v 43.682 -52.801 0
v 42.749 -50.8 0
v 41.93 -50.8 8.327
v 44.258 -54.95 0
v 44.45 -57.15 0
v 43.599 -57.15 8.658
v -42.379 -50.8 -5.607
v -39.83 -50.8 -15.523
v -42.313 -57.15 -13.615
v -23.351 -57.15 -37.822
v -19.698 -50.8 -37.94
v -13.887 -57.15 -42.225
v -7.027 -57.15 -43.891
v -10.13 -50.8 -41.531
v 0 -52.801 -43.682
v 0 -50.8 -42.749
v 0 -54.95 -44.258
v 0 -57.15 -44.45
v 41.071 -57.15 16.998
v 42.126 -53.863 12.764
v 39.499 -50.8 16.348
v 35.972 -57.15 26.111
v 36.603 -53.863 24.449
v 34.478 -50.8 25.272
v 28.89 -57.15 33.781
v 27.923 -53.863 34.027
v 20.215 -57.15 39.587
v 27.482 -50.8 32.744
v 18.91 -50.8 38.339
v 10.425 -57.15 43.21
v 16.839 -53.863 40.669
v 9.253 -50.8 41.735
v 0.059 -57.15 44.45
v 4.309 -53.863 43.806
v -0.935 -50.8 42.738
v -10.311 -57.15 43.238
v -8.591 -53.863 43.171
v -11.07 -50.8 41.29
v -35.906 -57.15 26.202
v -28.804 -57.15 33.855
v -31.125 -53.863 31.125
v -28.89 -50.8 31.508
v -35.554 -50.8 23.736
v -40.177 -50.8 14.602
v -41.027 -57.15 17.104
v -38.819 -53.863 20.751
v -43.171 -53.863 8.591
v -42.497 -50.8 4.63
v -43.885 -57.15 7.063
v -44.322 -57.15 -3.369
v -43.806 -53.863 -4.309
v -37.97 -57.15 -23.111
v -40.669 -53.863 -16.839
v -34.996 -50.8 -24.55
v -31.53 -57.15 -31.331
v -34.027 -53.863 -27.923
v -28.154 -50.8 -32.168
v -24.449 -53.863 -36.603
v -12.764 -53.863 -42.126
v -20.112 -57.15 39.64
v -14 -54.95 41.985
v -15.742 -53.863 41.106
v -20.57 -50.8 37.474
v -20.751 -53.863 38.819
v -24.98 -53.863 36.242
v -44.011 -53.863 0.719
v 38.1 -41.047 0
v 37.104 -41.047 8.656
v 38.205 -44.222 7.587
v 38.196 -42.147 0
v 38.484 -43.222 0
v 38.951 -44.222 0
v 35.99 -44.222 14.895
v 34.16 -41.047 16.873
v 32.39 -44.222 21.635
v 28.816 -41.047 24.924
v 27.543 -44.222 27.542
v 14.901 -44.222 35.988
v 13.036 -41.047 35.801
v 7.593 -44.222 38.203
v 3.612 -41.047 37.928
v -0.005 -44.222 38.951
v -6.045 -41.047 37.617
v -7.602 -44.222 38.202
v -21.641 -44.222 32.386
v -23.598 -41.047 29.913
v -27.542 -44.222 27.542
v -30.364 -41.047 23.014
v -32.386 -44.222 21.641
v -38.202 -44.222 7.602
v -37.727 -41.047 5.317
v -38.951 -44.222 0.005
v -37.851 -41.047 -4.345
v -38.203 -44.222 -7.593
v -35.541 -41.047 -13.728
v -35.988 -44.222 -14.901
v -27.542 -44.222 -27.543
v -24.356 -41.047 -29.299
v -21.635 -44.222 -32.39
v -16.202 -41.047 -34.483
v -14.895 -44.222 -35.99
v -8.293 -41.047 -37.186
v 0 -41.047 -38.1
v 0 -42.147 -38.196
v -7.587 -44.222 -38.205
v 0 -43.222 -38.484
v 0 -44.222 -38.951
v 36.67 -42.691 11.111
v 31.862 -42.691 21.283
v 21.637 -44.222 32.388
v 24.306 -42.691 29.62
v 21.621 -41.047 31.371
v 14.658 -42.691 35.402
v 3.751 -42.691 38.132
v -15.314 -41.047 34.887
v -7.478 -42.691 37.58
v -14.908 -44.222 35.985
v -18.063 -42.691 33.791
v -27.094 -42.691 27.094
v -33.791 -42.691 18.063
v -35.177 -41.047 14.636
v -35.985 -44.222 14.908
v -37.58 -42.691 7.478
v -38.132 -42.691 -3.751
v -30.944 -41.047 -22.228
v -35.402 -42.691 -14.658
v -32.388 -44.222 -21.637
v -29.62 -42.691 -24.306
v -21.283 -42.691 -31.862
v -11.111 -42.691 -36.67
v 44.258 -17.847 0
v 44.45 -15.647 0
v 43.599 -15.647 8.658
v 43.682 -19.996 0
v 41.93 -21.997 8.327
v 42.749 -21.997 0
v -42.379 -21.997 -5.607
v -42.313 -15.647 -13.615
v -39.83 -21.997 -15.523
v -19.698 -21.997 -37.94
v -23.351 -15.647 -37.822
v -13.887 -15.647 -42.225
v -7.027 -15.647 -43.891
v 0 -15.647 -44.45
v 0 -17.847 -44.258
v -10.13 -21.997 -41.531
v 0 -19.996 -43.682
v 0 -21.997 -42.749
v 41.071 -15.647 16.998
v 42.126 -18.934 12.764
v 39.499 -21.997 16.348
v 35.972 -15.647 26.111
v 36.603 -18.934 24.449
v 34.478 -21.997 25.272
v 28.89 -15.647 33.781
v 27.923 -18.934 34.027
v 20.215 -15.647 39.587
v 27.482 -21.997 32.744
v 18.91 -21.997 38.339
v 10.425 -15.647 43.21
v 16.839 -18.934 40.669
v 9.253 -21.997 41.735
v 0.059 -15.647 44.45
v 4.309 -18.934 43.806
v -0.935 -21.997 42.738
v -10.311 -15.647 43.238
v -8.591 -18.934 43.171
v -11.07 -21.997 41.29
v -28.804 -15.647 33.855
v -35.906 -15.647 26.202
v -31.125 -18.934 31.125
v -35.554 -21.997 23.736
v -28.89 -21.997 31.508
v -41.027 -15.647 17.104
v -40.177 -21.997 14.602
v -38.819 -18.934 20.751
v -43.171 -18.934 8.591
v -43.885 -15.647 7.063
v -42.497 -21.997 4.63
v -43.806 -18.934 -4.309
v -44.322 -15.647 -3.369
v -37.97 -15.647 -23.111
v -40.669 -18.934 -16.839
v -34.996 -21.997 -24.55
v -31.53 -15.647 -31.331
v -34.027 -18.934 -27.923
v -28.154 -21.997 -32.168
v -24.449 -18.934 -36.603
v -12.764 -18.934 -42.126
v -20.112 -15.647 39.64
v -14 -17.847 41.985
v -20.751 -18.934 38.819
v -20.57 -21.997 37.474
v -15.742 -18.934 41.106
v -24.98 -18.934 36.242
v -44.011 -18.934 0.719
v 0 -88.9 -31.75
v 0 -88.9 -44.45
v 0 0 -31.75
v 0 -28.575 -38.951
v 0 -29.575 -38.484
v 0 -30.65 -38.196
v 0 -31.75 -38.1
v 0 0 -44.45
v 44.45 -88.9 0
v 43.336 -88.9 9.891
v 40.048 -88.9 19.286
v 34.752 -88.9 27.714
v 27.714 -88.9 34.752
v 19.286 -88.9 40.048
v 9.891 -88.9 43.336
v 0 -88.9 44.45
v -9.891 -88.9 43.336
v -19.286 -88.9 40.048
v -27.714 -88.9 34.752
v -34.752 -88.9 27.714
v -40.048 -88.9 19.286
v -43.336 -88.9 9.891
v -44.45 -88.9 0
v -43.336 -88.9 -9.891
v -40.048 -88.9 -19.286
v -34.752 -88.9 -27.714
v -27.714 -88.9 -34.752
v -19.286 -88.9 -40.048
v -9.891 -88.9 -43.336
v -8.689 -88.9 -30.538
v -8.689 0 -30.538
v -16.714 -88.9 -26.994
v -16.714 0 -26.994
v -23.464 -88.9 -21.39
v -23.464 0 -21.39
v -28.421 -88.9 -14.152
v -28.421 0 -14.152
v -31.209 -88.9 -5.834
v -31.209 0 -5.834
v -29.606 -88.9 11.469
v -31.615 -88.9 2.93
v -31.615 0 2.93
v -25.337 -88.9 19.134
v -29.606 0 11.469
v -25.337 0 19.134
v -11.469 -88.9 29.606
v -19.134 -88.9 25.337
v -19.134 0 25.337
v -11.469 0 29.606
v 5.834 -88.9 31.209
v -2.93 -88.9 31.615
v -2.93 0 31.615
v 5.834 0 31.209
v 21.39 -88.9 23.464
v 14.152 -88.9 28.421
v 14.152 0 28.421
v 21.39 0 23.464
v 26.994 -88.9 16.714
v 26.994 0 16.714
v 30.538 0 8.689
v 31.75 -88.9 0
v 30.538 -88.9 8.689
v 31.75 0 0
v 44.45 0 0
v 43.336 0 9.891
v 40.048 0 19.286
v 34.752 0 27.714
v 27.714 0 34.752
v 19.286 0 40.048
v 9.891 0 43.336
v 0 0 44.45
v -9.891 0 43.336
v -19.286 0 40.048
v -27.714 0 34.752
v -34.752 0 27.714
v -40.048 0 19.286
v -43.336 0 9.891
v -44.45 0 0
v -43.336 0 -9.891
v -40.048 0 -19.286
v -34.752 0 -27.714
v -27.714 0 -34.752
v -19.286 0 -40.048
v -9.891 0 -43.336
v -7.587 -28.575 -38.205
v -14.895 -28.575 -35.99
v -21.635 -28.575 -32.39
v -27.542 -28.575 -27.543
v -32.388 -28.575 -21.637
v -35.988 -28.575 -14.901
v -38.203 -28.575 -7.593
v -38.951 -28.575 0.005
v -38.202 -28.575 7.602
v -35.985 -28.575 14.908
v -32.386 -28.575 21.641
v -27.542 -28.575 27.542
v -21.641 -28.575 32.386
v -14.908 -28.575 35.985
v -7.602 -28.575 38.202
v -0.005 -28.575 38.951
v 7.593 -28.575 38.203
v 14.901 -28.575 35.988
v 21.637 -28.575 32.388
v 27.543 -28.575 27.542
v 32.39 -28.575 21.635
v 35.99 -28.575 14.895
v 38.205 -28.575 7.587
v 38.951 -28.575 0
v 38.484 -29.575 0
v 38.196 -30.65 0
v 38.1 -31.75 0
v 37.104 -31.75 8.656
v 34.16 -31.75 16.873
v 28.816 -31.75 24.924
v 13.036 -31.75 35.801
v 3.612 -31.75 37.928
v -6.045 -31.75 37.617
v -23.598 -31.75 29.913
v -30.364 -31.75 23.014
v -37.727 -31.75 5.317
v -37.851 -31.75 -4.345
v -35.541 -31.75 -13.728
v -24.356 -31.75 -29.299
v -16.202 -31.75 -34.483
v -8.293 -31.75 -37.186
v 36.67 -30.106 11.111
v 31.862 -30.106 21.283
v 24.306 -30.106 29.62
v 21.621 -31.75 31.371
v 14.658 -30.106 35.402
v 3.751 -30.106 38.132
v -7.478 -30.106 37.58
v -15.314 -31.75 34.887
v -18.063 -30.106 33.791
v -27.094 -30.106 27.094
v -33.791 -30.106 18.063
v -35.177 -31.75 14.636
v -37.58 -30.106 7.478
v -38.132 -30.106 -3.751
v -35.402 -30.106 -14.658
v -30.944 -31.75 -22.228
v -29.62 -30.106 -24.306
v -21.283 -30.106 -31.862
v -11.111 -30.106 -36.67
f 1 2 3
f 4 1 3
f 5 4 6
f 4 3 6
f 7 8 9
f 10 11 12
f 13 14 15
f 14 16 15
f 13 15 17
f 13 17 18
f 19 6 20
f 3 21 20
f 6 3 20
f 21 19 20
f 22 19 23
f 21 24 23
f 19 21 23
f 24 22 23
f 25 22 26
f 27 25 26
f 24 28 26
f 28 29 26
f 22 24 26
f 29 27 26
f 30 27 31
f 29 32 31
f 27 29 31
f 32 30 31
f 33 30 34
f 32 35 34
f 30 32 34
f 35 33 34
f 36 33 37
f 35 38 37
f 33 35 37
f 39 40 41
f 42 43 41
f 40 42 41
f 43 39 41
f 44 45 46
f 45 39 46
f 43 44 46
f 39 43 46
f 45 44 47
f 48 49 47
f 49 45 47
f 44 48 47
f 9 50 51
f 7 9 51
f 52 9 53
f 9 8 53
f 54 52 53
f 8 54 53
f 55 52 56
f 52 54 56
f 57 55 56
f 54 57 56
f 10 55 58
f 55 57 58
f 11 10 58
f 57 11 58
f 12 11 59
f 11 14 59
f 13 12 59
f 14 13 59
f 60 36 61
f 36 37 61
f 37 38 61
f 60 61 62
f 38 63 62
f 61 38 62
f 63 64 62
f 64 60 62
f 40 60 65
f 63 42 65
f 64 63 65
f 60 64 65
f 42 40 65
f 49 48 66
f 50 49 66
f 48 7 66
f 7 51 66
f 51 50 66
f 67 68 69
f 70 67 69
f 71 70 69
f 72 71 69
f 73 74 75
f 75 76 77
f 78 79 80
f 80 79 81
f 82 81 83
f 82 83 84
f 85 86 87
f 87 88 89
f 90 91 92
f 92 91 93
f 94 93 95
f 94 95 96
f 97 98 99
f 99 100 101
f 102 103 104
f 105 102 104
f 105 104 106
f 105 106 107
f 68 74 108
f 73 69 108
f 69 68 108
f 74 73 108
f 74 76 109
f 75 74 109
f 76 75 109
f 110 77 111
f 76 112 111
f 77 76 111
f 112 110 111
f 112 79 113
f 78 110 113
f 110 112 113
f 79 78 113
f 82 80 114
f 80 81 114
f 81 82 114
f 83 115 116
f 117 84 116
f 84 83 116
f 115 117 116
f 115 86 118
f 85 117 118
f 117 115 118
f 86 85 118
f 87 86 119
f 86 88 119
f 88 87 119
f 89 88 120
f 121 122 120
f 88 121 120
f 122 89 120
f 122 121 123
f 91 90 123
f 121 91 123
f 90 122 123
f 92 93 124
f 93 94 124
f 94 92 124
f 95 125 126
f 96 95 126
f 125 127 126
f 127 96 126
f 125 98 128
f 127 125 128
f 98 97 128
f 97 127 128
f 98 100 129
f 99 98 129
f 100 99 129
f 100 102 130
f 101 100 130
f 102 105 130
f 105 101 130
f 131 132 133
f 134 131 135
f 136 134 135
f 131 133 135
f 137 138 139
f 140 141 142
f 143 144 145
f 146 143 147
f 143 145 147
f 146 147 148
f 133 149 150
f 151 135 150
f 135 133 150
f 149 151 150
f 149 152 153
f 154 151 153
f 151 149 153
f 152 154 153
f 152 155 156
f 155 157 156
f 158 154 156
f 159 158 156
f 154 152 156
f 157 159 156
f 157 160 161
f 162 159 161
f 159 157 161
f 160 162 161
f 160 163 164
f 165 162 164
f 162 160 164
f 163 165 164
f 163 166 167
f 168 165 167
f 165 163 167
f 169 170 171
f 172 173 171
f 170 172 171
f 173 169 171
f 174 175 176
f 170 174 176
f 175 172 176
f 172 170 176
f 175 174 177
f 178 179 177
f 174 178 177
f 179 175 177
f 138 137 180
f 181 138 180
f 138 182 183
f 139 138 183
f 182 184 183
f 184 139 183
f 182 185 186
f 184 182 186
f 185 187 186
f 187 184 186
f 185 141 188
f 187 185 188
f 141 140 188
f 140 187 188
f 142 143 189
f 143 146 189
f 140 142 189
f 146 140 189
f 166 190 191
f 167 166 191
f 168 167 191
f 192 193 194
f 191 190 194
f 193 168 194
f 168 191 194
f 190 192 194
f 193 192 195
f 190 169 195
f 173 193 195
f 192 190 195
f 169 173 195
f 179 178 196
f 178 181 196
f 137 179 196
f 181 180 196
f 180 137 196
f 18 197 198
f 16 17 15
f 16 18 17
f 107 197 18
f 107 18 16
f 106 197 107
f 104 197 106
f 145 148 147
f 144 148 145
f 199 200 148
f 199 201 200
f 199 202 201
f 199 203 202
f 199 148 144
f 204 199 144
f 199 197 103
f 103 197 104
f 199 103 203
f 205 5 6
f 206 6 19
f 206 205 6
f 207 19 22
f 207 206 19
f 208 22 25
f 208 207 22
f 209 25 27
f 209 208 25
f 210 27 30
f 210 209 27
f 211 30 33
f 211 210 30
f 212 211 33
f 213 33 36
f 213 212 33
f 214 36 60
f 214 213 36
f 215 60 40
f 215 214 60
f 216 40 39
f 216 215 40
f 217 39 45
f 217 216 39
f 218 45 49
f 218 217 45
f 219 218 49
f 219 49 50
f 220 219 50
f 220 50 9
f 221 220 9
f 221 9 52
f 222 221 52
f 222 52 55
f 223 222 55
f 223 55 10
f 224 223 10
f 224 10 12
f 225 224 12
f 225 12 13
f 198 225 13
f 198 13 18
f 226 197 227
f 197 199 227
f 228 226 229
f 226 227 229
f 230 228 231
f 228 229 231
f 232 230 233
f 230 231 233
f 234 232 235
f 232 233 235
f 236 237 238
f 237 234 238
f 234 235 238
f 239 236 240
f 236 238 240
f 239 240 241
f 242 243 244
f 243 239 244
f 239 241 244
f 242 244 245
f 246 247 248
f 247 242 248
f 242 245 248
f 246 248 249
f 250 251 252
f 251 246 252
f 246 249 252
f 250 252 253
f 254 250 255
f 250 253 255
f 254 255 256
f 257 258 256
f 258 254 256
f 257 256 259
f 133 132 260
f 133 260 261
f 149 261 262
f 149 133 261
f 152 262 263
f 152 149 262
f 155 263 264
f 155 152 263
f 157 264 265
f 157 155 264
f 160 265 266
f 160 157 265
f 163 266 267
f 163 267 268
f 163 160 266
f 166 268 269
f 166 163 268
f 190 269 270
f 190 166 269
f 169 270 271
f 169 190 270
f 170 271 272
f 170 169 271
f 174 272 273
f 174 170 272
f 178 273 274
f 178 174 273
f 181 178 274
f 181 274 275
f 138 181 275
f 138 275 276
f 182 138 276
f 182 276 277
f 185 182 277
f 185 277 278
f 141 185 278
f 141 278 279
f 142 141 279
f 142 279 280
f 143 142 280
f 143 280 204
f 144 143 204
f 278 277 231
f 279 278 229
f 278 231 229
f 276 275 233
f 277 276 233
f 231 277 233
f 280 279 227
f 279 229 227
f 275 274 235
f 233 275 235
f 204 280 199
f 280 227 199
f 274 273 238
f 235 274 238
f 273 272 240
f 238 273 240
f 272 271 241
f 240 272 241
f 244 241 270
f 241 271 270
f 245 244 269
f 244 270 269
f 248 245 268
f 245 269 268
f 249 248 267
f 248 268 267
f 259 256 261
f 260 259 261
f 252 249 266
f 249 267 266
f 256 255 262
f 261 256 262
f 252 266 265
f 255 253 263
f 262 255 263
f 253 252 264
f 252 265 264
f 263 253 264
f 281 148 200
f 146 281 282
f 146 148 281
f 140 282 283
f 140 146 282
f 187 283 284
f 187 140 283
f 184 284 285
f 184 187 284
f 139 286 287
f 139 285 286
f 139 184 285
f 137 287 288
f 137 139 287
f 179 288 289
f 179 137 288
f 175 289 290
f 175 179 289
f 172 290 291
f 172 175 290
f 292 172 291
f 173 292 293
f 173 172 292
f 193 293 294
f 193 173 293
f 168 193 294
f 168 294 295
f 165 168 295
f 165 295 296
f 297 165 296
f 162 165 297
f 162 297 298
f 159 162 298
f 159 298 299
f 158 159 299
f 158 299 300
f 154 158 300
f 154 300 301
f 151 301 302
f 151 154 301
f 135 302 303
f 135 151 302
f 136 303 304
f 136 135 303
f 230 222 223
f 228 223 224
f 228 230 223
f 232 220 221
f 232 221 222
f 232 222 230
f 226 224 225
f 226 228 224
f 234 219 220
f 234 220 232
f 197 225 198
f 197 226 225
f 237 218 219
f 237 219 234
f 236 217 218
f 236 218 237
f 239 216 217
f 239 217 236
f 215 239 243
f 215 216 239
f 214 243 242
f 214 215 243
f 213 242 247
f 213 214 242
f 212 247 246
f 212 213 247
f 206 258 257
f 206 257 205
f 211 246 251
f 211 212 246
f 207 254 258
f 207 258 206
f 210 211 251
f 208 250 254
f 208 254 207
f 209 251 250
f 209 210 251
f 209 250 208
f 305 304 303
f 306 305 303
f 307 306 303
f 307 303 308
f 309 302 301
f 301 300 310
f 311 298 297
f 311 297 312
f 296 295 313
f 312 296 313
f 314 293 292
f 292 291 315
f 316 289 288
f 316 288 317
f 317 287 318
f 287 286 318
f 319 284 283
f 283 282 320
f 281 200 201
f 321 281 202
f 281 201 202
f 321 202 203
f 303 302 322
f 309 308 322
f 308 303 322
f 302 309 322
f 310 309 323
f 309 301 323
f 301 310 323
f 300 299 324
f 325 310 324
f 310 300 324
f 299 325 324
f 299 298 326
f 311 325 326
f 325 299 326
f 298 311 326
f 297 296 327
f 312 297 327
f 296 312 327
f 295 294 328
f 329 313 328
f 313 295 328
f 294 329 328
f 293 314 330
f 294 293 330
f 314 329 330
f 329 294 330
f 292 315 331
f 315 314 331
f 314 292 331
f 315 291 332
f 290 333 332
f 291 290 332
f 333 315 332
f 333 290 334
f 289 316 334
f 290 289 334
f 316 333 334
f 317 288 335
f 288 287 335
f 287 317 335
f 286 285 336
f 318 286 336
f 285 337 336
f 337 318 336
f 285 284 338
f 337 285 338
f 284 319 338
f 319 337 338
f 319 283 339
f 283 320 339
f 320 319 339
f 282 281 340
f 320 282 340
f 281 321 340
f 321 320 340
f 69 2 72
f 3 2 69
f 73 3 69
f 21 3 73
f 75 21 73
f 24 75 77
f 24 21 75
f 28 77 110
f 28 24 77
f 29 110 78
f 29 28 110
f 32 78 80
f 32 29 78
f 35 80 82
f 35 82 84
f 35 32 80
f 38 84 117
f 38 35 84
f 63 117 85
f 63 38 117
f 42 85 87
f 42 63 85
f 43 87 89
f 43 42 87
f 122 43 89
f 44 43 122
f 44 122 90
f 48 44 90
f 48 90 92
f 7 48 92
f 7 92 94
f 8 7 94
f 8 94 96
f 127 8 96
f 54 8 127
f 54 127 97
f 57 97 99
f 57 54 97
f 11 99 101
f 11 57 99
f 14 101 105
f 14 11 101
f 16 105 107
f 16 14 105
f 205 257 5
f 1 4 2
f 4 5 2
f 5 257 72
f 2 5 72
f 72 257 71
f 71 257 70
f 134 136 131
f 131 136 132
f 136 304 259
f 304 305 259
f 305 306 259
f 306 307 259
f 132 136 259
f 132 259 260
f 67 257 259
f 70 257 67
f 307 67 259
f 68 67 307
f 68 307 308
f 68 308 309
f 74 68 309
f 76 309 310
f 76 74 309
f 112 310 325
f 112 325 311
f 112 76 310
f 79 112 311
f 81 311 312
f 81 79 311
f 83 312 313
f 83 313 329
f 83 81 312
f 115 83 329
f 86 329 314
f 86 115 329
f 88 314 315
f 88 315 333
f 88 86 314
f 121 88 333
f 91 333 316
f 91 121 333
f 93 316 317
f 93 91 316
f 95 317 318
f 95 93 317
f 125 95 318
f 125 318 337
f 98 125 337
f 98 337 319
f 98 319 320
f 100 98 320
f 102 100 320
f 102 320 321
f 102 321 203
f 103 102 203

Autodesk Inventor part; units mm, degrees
ref_plane "YZ Plane" through (0, 0, 0) normal (1, 0, 0) x (0, 1, 0)
ref_plane "XZ Plane" through (0, 0, 0) normal (0, 1, 0) x (-1, 0, 0)
ref_plane "XY Plane" through (0, 0, 0) normal (0, 0, 1) x (1, 0, 0)
sketch "Sketch1" plane through (0, 0, 0) normal (0, 0, 1) x (1, 0, 0)
  line L0 (0, 0) -> (31.75, 0) construction
  line L1 (31.75, 0) -> (44.45, 0)
  line L2 (44.45, 0) -> (44.45, -19.05)
  line L3 (44.45, -19.05) -> (38.1, -30.0485)
  line L4 (38.1, -30.0485) -> (38.1, -42.7485)
  line L5 (38.1, -42.7485) -> (44.45, -53.747)
  line L6 (44.45, -53.747) -> (44.45, -88.9)
  line L7 (44.45, -88.9) -> (31.75, -88.9)
  line L8 (31.75, -88.9) -> (31.75, 0)
  line L9 (0, 0) -> (0, -152.4)
  dimension "d0" = 31.75
  dimension "d1" = 12.7
  dimension "d2" = 6.35
  dimension "d3" = 150
  dimension "d4" = 19.05
  dimension "d5" = 88.9
  dimension "d6" = 150
  dimension "d7" = 12.7
  dimension "d9" = 152.4
revolve "Revolution1" add sketch "Sketch1" angle 270 about axis through (0, 0, 0) along (0, -1, 0)
fillet "Fillet1" radius 12.7 2 edges at (-31.4309, -19.05, 31.4309) (-31.4309, -53.747, 31.4309)
fillet "Fillet1" radius 6.35 2 edges at (-26.9408, -42.7485, 26.9408) (-26.9408, -30.0485, 26.9408)
equation "\"d6\" = d3"
properties part number "Foam Weight Shifter Pad 1"
